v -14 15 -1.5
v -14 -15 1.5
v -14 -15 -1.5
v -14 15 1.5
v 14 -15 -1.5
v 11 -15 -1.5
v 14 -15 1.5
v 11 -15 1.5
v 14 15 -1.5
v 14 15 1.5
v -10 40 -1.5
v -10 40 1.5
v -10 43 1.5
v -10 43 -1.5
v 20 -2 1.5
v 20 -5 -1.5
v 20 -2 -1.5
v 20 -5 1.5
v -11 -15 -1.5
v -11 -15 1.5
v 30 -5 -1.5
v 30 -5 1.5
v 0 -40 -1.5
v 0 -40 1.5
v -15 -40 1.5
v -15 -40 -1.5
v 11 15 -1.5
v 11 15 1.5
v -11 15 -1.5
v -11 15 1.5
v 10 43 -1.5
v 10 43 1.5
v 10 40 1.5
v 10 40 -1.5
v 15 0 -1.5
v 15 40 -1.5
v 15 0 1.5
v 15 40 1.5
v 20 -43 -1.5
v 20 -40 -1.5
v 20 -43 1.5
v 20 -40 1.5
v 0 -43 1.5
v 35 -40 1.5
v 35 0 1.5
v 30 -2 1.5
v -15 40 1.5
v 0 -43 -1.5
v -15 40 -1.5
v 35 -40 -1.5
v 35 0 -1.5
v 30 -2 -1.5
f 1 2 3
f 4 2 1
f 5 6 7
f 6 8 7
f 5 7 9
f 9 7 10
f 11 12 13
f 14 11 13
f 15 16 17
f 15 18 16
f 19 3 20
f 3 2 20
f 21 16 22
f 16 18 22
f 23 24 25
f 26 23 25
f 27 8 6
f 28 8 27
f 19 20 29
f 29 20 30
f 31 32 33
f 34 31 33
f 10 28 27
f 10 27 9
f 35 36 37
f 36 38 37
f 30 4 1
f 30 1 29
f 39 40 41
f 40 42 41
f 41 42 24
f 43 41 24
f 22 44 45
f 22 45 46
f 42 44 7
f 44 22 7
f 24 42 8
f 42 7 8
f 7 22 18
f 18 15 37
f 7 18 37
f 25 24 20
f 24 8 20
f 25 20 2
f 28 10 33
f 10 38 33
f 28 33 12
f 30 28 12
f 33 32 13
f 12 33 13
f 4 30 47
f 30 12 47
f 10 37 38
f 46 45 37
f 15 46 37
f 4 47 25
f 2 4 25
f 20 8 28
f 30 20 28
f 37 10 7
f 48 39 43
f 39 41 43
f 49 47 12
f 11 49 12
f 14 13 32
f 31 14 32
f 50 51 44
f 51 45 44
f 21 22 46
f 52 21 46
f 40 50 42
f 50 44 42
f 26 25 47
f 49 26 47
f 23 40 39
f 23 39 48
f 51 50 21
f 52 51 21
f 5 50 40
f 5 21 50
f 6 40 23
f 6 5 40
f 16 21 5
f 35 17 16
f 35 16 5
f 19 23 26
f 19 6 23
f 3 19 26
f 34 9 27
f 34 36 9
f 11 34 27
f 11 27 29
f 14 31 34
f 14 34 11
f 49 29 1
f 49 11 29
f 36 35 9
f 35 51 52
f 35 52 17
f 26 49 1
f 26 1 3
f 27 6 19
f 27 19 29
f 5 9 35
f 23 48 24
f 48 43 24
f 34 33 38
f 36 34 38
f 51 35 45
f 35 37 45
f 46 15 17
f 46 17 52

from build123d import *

# Parameters (mm, degrees)
SKETCH1_W           = 3
SKETCH1_H           = 30
SKETCH1_W_2         = 10
SKETCH1_H_2         = 3
BOSS_EXTRUDE2_DEPTH = 1.5


with BuildPart() as part:
    # Sketch1 → Boss-Extrude2 (new body, symmetric)
    with BuildSketch(Plane.XY):
        Polygon((10, 40), (15, 40), (15, 0), (35, 0), (35, -40), (20, -40), (20, -43), (0, -43), (0, -40), (-15, -40), (-15, 40), (-10, 40), (-10, 43), (10, 43), align=None)
        with Locations((-12.5, 0)):
            Rectangle(SKETCH1_W, SKETCH1_H, mode=Mode.SUBTRACT)
        with Locations((12.5, 0)):
            Rectangle(SKETCH1_W, SKETCH1_H, mode=Mode.SUBTRACT)
        with Locations((25, -3.5)):
            Rectangle(SKETCH1_W_2, SKETCH1_H_2, mode=Mode.SUBTRACT)
    extrude(amount=BOSS_EXTRUDE2_DEPTH, both=True)


solid = part.part
